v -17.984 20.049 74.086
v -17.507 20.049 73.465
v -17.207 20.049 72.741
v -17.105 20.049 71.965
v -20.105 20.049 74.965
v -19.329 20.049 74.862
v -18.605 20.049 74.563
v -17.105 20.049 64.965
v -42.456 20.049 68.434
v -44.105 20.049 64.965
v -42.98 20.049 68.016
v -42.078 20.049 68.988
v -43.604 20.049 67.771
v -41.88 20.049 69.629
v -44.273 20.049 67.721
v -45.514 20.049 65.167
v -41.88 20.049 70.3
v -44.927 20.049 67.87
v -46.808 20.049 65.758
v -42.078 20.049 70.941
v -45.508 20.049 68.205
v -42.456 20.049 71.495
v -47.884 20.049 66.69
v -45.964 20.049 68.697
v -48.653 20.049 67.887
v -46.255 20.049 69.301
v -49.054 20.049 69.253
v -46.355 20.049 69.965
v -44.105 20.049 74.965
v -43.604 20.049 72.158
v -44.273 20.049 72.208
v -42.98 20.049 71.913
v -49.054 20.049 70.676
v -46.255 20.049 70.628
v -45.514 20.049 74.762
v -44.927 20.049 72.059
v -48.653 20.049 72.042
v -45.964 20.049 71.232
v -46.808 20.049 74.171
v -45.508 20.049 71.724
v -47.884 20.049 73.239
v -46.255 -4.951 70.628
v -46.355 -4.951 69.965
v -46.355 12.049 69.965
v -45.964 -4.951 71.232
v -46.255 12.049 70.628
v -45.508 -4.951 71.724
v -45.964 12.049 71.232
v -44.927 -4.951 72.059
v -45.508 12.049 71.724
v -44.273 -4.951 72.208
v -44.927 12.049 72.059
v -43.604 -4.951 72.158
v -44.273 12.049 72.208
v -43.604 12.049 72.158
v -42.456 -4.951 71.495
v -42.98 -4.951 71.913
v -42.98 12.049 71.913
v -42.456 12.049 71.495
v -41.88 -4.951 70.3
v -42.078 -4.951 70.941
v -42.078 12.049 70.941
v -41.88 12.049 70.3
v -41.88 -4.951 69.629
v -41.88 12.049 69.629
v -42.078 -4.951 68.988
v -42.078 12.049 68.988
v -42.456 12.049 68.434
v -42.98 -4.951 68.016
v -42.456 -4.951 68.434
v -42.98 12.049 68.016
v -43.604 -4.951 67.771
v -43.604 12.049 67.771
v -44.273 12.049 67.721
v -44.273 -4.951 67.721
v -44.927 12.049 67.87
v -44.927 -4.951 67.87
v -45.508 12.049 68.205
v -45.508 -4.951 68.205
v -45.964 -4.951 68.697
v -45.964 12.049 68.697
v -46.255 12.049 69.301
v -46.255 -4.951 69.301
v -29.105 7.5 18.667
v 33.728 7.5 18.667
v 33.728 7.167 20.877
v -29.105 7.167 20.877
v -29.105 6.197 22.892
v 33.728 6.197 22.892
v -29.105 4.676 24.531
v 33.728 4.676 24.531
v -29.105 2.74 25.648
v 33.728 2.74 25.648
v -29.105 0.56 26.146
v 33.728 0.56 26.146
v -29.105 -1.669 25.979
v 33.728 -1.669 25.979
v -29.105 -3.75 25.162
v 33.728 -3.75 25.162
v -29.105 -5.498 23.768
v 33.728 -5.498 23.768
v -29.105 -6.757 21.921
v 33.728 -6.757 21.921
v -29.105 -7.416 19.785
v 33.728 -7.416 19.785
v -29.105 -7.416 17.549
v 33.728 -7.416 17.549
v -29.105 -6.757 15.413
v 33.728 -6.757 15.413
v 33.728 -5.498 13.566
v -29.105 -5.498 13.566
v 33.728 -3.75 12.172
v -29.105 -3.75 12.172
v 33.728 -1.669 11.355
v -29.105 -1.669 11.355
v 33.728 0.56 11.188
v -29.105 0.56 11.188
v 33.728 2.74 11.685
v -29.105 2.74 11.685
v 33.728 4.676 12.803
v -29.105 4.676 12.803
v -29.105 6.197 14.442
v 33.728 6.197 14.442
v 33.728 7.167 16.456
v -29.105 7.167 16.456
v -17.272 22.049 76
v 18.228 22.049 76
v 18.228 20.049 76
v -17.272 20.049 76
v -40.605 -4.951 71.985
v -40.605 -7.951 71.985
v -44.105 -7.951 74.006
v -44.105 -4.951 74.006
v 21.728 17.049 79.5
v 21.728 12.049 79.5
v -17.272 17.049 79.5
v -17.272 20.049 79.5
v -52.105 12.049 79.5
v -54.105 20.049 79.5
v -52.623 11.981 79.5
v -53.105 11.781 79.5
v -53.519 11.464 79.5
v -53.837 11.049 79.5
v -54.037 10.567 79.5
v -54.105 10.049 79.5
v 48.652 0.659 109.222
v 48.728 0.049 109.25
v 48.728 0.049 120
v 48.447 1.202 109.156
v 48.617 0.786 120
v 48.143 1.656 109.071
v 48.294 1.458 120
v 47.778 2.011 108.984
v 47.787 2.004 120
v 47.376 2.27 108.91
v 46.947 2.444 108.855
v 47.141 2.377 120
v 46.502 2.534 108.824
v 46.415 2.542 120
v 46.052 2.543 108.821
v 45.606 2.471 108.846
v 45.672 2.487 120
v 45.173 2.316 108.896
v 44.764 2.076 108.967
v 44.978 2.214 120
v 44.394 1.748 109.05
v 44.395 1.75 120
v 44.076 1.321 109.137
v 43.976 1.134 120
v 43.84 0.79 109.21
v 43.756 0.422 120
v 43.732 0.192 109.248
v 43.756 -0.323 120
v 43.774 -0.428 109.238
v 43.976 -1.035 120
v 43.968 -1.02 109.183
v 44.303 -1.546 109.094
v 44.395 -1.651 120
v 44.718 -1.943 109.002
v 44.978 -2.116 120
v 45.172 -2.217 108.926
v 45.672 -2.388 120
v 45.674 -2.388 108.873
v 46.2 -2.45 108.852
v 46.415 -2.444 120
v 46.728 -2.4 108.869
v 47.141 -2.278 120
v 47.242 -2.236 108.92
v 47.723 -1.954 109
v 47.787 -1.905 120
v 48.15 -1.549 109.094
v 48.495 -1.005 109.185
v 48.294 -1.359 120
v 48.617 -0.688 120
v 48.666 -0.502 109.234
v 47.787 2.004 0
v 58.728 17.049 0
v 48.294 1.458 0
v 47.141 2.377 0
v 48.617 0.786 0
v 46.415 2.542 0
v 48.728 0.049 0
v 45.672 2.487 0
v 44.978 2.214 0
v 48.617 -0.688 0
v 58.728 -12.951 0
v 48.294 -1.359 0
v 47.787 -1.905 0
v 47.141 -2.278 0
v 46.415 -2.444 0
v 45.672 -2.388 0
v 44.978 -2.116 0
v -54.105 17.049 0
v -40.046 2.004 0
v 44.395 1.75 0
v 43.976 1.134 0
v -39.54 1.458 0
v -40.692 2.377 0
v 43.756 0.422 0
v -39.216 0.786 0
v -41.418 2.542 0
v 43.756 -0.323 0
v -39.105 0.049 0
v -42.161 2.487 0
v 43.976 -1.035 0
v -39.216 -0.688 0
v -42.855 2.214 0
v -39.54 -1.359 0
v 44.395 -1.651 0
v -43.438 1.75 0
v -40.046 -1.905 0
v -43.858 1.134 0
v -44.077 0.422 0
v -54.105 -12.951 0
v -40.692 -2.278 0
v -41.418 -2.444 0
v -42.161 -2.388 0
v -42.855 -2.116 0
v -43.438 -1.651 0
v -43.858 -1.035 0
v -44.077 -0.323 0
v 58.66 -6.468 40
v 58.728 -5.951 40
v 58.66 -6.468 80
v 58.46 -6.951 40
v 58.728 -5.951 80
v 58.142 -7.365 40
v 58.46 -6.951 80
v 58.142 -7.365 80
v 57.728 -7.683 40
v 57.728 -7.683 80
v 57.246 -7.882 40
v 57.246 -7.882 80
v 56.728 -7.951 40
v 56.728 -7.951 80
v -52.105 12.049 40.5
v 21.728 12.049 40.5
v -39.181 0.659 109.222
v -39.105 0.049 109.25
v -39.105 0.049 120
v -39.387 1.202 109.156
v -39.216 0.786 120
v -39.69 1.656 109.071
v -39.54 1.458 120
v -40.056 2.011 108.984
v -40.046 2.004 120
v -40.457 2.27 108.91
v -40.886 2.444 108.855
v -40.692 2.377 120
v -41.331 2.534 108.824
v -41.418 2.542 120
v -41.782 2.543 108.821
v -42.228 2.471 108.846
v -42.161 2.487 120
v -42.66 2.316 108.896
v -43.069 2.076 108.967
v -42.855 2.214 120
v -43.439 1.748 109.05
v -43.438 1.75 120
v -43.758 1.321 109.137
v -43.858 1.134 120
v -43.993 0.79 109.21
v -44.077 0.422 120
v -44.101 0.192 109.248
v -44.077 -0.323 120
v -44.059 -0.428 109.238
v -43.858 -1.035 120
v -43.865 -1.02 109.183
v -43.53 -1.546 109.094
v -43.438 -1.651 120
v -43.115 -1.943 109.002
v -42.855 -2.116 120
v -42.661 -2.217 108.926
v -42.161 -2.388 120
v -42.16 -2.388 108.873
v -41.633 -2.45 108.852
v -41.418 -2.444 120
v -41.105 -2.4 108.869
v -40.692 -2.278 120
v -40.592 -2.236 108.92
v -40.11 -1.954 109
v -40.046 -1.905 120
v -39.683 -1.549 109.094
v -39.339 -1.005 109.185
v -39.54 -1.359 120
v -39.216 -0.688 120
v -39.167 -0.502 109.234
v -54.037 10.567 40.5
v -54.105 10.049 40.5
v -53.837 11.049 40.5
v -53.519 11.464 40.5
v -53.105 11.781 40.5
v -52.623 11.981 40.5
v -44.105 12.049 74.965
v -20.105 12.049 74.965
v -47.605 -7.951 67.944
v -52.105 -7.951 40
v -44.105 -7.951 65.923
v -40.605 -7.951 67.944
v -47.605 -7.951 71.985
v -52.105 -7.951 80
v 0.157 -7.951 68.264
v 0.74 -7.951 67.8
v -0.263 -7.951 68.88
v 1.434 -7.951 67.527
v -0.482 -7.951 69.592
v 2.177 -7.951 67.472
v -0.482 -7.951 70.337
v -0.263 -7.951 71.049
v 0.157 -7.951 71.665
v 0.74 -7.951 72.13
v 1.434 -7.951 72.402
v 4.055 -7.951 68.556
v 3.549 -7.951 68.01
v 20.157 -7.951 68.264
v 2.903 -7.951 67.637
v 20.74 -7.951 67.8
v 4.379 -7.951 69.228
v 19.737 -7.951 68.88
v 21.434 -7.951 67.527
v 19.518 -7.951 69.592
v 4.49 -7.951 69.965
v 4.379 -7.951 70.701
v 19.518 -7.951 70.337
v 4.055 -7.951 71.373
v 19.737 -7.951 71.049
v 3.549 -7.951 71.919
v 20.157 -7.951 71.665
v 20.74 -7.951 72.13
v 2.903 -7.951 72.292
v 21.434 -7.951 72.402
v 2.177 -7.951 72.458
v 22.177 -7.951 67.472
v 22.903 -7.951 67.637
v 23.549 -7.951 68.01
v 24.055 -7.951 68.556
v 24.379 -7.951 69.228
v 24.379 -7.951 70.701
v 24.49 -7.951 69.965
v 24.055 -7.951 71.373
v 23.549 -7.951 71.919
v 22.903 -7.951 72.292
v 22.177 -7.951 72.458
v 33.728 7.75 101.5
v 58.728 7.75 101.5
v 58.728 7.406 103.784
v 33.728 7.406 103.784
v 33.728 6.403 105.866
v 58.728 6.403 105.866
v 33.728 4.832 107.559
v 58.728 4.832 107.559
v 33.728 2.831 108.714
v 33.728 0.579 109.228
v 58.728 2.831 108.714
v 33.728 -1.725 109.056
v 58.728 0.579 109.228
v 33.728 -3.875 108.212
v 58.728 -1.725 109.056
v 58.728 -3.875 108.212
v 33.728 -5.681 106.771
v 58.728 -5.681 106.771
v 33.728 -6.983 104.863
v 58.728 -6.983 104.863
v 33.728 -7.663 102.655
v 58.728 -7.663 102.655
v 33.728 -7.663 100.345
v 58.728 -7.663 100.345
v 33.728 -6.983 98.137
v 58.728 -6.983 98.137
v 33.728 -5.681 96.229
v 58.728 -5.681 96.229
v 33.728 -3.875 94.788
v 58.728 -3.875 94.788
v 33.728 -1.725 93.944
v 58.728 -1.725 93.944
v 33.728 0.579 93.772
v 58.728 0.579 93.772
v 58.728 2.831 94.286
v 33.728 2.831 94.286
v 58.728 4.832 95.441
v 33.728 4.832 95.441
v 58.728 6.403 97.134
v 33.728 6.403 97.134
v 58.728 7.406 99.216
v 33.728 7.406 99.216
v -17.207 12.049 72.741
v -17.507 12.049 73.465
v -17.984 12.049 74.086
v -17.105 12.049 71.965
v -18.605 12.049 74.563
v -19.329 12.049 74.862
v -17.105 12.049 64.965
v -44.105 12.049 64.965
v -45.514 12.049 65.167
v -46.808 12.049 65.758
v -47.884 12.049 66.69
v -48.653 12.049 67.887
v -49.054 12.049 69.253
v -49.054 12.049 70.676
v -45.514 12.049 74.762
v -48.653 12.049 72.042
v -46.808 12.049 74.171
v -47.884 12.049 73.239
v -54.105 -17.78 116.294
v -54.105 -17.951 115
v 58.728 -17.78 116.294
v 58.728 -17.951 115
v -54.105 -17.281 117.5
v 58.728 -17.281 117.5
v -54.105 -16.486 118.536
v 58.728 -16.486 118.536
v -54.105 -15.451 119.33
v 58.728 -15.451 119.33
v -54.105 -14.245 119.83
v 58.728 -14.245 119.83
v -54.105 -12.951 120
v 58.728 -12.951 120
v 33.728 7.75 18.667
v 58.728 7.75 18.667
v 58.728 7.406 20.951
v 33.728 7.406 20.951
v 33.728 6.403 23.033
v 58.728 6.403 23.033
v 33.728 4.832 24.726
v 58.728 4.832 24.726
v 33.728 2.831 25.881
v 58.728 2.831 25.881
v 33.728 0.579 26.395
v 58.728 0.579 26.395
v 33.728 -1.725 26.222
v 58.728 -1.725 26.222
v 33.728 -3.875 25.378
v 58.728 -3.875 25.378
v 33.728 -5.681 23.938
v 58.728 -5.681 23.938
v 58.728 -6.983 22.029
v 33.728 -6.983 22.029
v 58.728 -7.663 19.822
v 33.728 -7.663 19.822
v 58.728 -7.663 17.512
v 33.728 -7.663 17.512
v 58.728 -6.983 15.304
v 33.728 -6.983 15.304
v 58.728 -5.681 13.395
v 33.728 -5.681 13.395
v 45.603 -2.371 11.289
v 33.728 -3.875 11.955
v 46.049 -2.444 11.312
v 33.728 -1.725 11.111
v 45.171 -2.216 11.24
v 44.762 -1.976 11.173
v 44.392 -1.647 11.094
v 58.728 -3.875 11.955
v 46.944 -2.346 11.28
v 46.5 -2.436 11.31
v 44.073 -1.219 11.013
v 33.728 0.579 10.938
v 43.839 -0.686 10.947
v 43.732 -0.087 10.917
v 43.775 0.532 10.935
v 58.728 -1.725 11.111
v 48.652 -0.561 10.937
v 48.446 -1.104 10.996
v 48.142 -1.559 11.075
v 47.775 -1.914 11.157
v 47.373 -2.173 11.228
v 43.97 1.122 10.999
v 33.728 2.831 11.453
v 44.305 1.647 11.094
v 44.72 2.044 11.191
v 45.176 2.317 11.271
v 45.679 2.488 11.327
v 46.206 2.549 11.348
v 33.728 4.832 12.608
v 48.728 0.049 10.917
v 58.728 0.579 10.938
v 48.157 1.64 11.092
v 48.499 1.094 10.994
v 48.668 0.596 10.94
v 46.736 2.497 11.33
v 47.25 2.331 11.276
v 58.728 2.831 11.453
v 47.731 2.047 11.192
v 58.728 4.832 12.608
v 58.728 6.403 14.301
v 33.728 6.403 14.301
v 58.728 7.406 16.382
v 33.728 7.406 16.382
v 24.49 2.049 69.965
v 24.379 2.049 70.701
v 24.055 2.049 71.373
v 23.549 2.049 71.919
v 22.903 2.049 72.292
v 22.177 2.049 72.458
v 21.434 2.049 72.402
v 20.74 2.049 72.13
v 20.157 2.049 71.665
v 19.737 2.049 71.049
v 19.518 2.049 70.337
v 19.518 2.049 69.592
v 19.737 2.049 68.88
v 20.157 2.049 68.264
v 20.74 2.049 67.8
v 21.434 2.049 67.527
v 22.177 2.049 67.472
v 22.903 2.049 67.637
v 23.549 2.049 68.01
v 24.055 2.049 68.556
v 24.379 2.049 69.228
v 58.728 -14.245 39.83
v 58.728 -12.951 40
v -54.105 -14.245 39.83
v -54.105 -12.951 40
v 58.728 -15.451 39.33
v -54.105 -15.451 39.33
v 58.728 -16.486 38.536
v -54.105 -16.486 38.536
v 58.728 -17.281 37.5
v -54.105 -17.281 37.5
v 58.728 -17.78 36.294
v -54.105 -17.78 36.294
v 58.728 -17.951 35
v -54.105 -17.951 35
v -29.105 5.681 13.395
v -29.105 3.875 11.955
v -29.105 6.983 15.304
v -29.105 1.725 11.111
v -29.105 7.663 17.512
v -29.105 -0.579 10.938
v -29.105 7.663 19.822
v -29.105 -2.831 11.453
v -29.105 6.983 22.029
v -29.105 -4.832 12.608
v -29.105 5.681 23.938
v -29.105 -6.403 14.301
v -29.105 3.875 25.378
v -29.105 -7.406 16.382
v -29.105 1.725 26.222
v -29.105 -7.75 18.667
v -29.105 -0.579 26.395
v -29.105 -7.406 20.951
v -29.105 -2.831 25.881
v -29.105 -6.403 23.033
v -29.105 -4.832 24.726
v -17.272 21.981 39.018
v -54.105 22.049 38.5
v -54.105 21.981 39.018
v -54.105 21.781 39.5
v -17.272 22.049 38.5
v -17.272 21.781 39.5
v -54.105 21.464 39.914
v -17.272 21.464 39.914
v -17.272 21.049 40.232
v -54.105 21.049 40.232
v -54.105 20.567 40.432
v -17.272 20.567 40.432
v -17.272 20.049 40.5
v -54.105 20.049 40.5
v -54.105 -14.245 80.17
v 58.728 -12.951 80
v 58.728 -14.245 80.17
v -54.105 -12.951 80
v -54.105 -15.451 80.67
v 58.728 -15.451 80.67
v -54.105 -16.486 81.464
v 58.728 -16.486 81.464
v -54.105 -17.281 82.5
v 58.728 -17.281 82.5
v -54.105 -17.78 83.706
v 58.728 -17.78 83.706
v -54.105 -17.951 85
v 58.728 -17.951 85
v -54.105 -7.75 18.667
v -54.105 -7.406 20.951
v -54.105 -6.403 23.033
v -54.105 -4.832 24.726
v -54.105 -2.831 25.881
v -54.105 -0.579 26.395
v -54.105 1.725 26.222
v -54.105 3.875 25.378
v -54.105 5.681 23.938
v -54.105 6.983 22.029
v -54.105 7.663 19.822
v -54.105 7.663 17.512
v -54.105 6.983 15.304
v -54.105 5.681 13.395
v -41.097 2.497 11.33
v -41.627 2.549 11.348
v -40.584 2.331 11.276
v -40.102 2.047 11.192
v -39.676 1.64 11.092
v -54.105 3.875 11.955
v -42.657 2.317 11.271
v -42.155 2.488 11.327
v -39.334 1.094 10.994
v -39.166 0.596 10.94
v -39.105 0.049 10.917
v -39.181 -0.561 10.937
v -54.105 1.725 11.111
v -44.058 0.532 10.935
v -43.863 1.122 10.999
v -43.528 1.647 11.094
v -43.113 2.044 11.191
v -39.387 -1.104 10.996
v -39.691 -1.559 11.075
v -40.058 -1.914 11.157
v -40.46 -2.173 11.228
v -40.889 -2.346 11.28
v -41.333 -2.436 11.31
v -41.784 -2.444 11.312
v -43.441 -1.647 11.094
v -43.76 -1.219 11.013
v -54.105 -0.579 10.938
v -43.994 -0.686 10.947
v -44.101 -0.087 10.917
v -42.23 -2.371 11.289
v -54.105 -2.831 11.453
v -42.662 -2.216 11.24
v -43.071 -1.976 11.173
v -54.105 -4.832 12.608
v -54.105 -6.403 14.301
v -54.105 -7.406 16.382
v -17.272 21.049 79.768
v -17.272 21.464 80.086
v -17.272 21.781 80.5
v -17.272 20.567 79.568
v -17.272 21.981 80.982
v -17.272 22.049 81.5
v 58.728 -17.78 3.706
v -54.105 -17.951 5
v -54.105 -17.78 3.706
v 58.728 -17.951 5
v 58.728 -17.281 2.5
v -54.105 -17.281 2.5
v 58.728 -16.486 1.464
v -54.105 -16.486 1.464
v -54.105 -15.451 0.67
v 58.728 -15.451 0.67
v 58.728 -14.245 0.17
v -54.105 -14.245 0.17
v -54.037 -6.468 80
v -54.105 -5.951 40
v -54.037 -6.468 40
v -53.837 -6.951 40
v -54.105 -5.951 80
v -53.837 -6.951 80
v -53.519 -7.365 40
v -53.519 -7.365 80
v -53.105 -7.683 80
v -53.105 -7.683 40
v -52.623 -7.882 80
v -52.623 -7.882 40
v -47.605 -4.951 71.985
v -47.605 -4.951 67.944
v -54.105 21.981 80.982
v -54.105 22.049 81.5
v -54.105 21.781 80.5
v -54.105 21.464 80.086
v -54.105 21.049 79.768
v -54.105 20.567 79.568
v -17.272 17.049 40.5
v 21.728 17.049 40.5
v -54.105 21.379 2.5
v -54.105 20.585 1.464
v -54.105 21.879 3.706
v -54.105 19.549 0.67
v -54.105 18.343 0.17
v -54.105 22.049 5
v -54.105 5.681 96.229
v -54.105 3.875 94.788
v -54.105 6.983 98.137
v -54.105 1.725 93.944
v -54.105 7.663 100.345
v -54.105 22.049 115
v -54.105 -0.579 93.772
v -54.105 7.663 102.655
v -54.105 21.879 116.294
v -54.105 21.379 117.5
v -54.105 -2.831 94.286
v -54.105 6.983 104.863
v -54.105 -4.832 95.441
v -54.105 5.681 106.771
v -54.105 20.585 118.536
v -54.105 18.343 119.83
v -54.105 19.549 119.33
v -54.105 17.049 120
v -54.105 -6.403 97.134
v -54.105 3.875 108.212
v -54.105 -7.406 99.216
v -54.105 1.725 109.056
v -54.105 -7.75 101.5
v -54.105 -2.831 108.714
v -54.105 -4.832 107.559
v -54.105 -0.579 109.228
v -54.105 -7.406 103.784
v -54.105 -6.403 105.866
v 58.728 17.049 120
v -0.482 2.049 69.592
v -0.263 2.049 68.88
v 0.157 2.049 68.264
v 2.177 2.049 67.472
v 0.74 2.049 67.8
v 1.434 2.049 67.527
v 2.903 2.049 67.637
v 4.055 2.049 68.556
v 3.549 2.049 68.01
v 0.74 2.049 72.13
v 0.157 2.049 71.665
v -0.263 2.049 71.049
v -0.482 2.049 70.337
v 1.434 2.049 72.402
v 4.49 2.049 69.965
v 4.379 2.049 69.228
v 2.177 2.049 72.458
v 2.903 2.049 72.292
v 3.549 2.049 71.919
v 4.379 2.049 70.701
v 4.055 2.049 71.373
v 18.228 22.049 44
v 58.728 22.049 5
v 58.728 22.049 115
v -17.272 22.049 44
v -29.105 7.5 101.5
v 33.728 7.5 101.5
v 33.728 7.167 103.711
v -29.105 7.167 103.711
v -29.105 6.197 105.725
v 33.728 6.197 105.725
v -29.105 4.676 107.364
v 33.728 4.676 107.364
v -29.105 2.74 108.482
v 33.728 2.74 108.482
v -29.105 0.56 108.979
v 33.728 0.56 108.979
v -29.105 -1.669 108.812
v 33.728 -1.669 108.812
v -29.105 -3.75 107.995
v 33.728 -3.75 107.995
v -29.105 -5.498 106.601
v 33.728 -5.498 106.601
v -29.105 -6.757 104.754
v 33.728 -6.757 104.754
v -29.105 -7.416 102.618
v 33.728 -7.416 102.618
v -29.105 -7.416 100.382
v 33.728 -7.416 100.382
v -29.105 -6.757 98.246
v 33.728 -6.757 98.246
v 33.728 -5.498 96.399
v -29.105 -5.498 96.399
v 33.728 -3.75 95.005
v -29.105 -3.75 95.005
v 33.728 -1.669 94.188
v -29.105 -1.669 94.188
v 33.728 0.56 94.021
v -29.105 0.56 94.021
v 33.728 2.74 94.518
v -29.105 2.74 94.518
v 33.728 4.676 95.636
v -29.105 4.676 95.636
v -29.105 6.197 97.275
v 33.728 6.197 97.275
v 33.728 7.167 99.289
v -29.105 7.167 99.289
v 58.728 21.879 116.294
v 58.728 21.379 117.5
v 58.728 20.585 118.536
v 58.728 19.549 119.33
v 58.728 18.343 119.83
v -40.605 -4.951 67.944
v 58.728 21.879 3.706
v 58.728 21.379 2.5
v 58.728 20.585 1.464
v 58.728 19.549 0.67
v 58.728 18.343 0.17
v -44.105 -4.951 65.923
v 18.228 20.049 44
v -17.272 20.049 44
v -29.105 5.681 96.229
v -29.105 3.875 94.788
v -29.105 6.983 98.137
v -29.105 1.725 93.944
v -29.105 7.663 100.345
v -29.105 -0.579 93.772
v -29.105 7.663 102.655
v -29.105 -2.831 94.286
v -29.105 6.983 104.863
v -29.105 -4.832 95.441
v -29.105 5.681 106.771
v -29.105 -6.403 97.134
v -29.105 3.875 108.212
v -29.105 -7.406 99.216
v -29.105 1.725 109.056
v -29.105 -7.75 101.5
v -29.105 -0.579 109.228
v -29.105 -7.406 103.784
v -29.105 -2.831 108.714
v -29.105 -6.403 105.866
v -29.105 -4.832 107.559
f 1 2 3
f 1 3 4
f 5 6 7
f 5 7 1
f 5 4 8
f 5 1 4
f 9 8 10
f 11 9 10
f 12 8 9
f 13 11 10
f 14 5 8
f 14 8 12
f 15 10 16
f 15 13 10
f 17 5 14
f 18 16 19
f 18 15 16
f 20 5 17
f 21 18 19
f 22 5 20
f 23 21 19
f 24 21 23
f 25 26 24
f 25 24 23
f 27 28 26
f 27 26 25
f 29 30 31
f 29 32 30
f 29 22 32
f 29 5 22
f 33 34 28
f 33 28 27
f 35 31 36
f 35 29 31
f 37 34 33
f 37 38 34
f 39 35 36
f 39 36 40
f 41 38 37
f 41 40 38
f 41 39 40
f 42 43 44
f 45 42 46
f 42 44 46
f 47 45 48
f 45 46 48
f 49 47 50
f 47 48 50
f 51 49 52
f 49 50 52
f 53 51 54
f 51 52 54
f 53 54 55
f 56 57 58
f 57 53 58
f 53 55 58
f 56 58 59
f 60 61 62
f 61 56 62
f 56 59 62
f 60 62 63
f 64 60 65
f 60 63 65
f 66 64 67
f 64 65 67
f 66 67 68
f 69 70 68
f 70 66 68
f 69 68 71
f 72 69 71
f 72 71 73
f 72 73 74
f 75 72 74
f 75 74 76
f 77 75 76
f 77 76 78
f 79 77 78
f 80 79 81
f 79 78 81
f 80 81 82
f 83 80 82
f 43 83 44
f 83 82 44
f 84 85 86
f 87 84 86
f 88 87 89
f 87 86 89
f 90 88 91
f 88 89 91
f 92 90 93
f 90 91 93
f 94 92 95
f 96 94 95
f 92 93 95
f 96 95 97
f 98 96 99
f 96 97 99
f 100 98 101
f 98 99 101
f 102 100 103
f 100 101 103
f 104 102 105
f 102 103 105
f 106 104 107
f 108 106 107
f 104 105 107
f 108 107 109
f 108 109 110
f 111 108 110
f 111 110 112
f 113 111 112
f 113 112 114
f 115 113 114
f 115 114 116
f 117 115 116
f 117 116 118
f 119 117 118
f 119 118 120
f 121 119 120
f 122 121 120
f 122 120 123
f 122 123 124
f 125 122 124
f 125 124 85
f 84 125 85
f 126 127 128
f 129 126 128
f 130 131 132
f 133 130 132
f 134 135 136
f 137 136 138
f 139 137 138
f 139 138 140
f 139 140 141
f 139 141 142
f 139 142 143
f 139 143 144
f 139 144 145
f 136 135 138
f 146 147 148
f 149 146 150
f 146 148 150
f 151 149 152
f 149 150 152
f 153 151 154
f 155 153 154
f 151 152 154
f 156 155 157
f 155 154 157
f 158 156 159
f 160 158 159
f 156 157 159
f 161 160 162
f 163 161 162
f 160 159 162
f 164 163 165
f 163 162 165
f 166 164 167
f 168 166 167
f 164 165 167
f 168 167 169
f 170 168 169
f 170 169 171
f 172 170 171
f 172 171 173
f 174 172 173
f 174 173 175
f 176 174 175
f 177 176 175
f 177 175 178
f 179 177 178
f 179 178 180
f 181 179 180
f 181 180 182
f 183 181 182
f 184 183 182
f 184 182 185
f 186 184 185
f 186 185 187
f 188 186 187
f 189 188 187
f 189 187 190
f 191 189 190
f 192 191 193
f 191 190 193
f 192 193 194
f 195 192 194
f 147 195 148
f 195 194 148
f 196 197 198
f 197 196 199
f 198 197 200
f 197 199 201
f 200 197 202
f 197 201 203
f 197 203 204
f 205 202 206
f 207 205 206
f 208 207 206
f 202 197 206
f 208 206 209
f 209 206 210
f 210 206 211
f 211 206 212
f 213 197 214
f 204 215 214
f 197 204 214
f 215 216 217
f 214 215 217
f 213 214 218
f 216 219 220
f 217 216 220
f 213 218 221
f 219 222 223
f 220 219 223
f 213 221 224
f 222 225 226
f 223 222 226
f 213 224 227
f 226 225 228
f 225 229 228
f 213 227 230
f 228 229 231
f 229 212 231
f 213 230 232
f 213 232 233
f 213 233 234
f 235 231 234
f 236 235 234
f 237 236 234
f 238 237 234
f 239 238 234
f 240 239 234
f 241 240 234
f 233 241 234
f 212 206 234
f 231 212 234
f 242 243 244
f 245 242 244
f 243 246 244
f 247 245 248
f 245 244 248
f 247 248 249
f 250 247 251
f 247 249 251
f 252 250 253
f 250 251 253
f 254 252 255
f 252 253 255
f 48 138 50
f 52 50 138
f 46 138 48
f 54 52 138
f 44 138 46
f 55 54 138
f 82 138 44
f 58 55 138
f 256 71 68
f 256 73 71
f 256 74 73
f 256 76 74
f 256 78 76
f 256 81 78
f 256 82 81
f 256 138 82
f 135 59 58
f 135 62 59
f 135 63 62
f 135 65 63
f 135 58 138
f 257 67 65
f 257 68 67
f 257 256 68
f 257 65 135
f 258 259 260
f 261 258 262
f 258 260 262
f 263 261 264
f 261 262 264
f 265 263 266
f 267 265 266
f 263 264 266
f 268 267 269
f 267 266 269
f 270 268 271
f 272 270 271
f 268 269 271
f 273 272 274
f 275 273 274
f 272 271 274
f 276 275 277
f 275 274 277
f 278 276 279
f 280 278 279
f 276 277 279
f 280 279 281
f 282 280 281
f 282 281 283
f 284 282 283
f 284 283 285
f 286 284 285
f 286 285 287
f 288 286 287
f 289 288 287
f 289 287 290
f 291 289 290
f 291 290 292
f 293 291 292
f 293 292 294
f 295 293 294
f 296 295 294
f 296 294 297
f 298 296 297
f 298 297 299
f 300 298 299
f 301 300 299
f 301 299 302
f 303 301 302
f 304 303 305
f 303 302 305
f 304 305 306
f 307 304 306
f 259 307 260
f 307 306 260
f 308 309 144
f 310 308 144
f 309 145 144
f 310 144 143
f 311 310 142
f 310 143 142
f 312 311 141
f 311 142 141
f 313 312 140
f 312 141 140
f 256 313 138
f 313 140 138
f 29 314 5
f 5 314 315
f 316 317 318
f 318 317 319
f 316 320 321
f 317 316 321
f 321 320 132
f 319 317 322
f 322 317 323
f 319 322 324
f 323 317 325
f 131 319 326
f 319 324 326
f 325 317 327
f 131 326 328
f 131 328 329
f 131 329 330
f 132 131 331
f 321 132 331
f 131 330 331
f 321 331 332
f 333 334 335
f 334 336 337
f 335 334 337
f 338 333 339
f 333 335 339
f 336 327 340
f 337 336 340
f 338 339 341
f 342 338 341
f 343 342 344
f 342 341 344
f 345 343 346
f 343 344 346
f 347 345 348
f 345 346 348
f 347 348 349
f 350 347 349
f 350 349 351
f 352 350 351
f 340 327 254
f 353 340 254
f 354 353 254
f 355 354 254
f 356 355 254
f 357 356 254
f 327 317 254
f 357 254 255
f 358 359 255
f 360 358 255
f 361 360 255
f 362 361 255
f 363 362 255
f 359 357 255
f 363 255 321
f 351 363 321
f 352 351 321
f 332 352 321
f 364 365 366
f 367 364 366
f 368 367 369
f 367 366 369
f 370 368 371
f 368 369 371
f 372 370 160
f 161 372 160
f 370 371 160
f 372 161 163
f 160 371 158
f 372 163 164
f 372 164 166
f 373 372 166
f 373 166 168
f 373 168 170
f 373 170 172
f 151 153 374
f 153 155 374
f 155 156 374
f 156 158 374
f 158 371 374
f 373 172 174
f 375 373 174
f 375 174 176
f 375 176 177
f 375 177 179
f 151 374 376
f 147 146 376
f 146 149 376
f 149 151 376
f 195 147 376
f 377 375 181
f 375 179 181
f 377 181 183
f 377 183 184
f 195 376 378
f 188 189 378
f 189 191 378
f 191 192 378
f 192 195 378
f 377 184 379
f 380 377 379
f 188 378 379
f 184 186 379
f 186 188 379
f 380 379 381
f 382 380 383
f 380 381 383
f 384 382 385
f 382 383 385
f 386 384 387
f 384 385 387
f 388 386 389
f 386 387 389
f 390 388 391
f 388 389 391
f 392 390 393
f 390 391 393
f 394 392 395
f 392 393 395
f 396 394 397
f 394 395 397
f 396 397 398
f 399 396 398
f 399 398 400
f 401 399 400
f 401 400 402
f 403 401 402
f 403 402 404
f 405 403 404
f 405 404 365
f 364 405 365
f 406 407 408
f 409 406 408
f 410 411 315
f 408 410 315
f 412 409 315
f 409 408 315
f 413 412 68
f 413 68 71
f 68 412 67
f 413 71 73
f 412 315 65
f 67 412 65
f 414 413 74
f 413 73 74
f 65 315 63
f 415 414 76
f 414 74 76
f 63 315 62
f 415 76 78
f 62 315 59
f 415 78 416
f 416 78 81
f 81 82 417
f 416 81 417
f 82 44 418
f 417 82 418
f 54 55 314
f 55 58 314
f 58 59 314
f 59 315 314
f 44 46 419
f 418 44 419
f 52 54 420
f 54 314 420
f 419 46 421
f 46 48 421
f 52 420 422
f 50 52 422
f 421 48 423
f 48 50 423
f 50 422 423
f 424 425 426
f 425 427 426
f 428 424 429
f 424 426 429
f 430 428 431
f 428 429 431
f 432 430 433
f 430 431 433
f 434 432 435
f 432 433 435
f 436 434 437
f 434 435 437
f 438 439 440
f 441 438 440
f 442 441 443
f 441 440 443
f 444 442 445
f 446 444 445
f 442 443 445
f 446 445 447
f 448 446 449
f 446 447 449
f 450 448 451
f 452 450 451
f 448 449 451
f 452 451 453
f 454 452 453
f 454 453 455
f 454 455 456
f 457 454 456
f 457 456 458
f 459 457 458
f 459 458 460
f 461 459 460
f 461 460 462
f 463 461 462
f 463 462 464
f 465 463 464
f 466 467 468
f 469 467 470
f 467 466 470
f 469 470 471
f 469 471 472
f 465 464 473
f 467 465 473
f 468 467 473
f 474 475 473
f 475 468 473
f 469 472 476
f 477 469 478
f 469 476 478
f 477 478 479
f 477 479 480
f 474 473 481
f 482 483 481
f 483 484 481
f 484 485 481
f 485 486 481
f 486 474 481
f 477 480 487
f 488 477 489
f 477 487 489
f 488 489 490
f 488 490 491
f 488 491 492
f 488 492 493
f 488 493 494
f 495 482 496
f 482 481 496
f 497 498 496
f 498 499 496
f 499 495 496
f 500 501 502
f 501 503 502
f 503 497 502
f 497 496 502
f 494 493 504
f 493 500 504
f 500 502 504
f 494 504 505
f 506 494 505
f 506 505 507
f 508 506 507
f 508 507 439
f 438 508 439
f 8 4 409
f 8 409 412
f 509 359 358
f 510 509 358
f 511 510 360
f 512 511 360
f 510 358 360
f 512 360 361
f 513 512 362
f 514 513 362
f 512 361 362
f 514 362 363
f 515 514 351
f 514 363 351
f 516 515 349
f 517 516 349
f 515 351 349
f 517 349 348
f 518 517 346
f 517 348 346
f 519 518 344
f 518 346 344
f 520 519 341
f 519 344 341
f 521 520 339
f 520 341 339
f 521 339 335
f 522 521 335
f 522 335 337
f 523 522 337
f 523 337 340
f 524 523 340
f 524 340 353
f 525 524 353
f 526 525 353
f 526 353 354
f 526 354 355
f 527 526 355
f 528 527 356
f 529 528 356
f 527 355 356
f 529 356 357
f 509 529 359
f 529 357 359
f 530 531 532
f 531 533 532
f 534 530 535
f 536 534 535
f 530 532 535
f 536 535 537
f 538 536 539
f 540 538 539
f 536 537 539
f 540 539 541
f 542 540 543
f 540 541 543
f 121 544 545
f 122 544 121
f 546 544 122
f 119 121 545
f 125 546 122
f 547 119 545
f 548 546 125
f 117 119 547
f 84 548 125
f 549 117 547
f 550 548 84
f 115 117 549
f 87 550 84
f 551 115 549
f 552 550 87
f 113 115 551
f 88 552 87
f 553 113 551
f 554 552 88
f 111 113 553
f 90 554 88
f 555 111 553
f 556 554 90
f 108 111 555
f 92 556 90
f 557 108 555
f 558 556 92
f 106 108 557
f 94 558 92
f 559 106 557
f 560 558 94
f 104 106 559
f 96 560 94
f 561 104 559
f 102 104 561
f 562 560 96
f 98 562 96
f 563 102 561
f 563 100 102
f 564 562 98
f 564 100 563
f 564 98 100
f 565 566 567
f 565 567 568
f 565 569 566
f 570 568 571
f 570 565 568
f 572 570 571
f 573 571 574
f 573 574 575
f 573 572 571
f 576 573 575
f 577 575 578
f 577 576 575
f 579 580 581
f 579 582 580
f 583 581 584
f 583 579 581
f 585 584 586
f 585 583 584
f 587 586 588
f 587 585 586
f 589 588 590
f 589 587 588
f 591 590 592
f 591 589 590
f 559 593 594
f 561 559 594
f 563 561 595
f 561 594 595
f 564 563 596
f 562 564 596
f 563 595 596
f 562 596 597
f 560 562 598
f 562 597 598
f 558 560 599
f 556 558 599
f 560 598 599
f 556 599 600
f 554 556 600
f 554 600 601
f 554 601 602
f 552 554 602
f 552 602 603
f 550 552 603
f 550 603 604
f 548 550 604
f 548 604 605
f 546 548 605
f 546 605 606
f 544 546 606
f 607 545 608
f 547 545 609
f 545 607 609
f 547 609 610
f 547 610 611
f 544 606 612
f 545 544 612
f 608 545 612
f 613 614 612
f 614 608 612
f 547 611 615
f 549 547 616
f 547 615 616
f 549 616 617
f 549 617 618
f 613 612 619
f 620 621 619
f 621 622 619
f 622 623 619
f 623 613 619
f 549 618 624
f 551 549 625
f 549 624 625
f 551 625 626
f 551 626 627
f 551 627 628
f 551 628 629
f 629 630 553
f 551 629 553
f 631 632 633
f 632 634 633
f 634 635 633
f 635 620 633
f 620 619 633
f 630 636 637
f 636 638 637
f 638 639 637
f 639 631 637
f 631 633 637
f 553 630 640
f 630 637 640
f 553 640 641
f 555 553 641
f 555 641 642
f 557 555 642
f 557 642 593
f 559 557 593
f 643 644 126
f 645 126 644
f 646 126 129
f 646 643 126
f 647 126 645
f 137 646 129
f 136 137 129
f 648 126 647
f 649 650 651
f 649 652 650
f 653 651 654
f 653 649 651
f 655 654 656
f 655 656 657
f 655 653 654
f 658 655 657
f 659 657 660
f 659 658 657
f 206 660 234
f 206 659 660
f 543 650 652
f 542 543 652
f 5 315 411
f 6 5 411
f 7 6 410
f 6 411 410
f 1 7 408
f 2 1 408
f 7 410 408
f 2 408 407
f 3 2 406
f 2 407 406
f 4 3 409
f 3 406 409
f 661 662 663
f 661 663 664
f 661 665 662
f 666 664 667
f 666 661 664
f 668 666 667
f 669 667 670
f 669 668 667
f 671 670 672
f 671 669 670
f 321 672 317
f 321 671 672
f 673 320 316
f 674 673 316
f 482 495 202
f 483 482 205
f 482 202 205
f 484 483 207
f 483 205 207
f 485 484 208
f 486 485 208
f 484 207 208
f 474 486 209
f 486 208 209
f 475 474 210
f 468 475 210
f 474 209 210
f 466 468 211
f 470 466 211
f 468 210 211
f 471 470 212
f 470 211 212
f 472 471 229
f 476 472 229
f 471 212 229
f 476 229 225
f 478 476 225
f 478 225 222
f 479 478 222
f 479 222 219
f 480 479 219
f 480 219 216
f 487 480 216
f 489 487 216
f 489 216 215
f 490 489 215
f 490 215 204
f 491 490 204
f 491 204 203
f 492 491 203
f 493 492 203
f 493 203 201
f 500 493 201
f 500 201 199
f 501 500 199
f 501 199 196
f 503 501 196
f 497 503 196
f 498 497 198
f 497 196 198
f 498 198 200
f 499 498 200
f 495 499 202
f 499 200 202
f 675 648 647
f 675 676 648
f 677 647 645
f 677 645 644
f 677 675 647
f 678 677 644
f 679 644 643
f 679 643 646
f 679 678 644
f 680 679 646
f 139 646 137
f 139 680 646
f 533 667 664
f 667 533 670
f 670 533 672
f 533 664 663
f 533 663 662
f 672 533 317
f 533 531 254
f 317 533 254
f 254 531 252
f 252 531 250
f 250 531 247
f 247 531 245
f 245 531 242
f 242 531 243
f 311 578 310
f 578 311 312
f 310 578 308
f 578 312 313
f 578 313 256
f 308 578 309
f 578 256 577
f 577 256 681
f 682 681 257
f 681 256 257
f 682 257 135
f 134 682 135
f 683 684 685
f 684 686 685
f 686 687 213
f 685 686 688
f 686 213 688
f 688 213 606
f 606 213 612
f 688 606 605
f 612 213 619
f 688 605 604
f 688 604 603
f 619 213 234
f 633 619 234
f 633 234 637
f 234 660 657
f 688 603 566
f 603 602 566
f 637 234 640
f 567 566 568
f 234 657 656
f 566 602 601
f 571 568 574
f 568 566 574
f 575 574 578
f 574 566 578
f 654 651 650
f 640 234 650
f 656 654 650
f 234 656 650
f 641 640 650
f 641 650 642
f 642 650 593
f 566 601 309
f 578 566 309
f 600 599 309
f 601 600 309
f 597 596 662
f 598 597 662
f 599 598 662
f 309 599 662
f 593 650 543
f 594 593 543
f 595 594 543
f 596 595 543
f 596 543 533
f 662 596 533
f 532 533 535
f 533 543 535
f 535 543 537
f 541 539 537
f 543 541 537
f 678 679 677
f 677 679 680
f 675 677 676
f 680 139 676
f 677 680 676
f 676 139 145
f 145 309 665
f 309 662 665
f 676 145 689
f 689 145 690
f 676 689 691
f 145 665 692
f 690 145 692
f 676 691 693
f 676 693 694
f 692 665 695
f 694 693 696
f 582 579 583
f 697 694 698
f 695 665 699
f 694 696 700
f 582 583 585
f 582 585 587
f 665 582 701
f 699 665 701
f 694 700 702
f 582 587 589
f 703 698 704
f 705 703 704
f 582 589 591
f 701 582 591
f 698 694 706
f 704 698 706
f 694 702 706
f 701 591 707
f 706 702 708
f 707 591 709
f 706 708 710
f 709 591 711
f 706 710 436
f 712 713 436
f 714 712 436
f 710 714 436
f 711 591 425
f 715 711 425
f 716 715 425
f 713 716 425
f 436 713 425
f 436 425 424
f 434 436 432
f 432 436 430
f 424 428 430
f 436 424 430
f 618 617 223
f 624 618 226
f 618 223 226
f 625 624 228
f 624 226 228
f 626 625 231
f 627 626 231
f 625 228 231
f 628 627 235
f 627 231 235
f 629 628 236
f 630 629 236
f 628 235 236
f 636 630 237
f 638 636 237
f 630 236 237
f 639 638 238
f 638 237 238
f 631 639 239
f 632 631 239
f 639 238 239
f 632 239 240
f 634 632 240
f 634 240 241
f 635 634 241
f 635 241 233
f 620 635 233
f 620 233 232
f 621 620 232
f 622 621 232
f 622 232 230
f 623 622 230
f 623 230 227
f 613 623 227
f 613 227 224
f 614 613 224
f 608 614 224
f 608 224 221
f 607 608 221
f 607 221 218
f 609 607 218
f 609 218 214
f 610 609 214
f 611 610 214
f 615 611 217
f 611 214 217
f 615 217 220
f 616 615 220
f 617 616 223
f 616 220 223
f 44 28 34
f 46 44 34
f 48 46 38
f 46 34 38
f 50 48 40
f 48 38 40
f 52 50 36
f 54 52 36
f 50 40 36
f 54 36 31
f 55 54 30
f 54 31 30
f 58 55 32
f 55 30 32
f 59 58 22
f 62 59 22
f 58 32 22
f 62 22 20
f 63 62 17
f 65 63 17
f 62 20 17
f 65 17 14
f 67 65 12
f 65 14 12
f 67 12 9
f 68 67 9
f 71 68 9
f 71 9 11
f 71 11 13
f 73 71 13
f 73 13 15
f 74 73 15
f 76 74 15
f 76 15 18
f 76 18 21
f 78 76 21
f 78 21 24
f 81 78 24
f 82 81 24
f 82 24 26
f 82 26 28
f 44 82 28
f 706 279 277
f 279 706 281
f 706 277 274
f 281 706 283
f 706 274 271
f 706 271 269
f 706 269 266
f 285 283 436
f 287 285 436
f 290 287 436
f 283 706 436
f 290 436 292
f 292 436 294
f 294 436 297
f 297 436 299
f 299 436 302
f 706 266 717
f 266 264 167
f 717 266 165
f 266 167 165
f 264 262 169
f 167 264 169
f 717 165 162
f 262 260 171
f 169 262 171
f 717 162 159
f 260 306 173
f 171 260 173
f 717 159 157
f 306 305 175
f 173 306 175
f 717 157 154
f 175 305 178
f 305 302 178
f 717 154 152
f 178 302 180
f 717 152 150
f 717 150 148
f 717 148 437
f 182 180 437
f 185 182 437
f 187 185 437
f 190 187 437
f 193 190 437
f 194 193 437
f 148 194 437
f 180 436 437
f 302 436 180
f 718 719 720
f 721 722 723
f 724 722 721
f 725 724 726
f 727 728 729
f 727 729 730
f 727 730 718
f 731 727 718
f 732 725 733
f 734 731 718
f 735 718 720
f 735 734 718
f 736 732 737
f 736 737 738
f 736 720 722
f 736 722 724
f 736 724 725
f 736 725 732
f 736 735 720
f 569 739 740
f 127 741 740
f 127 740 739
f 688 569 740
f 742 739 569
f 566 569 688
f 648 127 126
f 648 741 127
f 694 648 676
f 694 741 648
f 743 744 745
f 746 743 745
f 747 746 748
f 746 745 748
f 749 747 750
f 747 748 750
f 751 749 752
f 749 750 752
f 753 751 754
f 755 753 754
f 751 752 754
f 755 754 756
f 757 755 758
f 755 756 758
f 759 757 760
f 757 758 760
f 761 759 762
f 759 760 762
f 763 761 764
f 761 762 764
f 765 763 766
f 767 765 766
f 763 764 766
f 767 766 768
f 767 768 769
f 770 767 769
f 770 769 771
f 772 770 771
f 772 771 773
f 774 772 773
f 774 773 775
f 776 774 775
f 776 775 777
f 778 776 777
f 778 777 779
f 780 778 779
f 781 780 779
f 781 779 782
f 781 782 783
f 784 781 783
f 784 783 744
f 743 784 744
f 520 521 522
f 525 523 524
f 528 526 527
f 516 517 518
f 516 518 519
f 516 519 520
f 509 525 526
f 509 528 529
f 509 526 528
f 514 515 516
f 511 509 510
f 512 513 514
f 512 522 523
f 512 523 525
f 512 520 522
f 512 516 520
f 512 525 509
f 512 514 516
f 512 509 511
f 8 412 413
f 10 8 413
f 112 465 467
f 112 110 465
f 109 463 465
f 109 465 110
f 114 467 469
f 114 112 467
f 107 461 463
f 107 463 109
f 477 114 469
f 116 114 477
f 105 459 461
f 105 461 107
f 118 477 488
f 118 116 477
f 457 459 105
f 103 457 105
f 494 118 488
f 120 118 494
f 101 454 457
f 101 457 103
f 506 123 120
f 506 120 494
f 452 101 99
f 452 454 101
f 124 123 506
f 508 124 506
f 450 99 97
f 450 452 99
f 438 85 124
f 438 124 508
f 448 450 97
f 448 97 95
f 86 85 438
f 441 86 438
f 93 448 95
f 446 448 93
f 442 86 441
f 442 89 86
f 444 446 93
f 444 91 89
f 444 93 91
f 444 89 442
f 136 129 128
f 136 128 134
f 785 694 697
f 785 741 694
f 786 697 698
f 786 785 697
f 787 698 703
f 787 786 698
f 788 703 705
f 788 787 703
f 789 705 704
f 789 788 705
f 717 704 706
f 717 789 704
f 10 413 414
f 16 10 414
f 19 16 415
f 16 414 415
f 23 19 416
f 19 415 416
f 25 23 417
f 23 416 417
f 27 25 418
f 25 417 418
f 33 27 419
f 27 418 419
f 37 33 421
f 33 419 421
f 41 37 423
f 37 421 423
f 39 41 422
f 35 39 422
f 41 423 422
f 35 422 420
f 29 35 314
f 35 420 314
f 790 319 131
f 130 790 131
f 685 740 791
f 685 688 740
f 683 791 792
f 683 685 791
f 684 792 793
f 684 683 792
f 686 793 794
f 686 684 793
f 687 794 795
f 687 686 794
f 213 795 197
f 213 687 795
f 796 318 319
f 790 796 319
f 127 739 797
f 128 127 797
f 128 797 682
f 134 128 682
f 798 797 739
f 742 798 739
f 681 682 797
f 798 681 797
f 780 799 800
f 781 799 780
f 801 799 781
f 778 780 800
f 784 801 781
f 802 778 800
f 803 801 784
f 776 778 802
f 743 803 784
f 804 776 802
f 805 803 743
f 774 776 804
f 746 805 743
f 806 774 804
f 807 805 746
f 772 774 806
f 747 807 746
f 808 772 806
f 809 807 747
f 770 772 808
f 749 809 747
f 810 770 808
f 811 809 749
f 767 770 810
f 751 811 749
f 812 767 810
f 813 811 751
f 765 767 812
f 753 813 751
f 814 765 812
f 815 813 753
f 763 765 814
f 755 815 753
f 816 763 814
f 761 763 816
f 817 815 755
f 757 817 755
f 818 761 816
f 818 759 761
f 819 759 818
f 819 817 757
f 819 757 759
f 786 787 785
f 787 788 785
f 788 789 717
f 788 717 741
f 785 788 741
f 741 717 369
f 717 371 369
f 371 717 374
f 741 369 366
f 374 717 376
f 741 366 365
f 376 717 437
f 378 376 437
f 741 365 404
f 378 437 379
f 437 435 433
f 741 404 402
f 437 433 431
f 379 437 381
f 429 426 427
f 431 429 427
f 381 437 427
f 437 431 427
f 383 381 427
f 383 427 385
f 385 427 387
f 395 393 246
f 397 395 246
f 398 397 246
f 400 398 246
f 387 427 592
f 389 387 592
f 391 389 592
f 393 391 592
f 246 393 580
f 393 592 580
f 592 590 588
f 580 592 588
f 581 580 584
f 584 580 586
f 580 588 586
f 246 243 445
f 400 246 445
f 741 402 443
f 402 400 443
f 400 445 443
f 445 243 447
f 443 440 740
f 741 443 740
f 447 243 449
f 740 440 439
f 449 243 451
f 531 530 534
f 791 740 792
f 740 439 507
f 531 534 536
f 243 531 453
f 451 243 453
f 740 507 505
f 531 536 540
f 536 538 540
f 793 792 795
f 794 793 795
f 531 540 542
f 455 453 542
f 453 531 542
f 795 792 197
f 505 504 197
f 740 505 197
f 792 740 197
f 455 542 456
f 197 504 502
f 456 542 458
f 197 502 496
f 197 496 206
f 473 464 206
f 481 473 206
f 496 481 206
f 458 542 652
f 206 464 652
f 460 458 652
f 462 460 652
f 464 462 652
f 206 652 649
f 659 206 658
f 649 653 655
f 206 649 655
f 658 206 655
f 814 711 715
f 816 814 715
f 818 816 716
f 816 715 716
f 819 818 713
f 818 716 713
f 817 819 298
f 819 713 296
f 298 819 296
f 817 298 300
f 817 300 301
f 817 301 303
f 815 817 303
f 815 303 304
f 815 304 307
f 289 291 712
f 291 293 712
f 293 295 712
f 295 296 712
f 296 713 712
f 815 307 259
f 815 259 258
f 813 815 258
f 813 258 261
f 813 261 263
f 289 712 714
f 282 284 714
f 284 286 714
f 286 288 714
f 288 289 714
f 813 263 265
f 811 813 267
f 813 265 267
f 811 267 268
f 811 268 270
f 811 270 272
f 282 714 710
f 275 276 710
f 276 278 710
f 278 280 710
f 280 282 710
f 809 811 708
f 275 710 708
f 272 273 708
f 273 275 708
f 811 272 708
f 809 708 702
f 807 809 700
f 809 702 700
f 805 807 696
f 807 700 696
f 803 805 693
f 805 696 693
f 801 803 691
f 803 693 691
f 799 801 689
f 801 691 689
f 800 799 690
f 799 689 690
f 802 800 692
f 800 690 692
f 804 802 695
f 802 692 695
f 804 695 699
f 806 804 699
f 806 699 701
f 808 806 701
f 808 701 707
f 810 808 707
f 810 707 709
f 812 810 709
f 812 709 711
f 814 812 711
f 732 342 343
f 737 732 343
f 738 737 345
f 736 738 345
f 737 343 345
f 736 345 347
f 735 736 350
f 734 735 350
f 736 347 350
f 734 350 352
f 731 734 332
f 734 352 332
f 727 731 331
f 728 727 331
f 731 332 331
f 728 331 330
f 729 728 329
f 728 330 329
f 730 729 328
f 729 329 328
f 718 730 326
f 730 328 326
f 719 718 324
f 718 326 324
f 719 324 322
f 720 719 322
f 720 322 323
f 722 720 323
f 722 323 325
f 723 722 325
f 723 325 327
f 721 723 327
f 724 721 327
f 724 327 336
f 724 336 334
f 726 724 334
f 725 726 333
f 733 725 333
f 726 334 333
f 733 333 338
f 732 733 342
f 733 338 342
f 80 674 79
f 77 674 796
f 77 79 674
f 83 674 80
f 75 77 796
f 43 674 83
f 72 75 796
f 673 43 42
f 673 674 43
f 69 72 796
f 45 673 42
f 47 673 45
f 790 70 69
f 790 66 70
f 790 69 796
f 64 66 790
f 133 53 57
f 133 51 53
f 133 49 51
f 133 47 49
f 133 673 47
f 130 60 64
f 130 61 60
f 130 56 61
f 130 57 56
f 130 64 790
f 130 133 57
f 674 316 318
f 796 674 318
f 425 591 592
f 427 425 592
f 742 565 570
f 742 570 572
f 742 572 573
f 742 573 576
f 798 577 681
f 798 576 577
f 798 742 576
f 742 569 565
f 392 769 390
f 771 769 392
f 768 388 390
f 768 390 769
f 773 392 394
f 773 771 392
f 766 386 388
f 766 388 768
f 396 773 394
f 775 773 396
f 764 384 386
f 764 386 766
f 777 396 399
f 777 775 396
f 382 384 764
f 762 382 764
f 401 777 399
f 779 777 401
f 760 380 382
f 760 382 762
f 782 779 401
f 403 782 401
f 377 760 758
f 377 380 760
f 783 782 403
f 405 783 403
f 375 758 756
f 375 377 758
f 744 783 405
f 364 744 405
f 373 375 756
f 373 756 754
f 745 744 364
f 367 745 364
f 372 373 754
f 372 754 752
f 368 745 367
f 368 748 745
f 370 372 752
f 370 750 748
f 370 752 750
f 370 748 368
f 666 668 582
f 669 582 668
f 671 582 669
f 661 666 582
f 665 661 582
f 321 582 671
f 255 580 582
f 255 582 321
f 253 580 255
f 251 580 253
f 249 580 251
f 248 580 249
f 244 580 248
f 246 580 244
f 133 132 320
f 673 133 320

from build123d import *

# Parameters (mm, degrees)
F0_W      = 112.8332
F0_H      = 30
F1_DEPTH  = 120
F3_DEPTH  = 10
F6_DEPTH  = 39
F7_DEPTH  = 39
F8_R      = 7.5
F8_W      = 10
F8_H      = 40
F9_DEPTH  = 120
F11_DEPTH = 8
F12_R     = 2.25
F13_DEPTH = 50
F14_R     = 2.25
F15_DEPTH = 3
F16_R     = 5
F17_R     = 2
F14_R_2   = 2.5
F18_DEPTH = 10
F19_R     = 7.75
F19_R_2   = 7.5
F20_DEPTH = 25
F21_R     = 7.75
F21_R_2   = 7.5
F22_DEPTH = 25
F24_R     = 2.5
F23_R     = 2.5
F25_DEPTH = 13.1
F26_DEPTH = 25


with BuildPart() as f1:
    # F0 (on Top) → F1 (new body)
    with BuildSketch(Plane.XY):
        with Locations((2.3114552433, -2.9506393059)):
            Rectangle(F0_W, F0_H)
    extrude(amount=F1_DEPTH)

    # F2 (on face) → F3 (join)
    with BuildSketch(Plane(origin=(0, 12.0493606941, 0), x_dir=(-1, 0, 0), z_dir=(0, 1, 0))):
        Polygon((17.2719447567, 40.5), (-21.7280552433, 40.5), (-21.7280552433, 79.5), (17.2719447567, 79.5), (54.1051447567, 79.5), (54.1051447567, 120), (-58.7280552433, 120), (-58.7280552433, 0), (54.1051447567, 0), (54.1051447567, 40.5), align=None)
    extrude(amount=F3_DEPTH)

    # F5 (on face) → F6 (join)
    with BuildSketch(Plane(origin=(21.7280552433, 0, 0), x_dir=(0, -1, 0), z_dir=(-1, 0, 0))):
        Polygon((-22.0493606941, 40.5), (-17.0493606941, 40.5), (-20.0493606941, 44), (-22.0493606941, 44), align=None)
        Polygon((-22.0493606941, 79.5), (-22.0493606941, 76), (-20.0493606941, 76), (-17.0493606941, 79.5), align=None)
    extrude(amount=F6_DEPTH)

    # F4 (on face) → F7 (join)
    with BuildSketch(Plane.XY.offset(40.5)):
        Polygon((21.7280552433, 22.0493606941), (18.2280552433, 22.0493606941), (18.2280552433, 20.0493606941), (21.7280552433, 17.0493606941), align=None)
    extrude(amount=F7_DEPTH)

    # F8 (on face) → F9 (cut)
    with BuildSketch(Plane.YZ.offset(58.7280552433)):
        with Locations((0, 101.5)):
            Circle(F8_R)
        with Locations((0, 18.6668)):
            Circle(F8_R)
        with Locations((-12.9506393059, 60)):
            Rectangle(F8_W, F8_H)
    extrude(amount=-F9_DEPTH, mode=Mode.SUBTRACT)


with BuildPart() as f11:
    # F10 (on face) → F11 (new body)
    with BuildSketch(Plane(origin=(0, 12.0493606941, 0), x_dir=(-1, 0, 0), z_dir=(0, 1, 0))):
        with BuildLine():
            Line((17.1051447567, 64.9645727873), (44.1051447567, 64.9645727873))
            ThreePointArc((44.1051447567, 64.9645727873), (49.1051447567, 69.9645727873), (44.1051447567, 74.9645727873))
            Line((44.1051447567, 74.9645727873), (20.1051447567, 74.9645727873))
            ThreePointArc((20.1051447567, 74.9645727873), (17.9838244131, 74.0858931308), (17.1051447567, 71.9645727873))
            Line((17.1051447567, 71.9645727873), (17.1051447567, 64.9645727873))
        make_face()
    extrude(amount=F11_DEPTH)


with BuildPart() as f13_tool:
    # F12 (on face) → F13 (new body)
    with BuildSketch(Plane(origin=(0, 20.0493606941, 0), x_dir=(-1, 0, 0), z_dir=(0, 1, 0))):
        with Locations((44.1051447567, 69.9645727873)):
            Circle(F12_R)
    extrude(amount=-F13_DEPTH)


with BuildPart() as f1_1:
    add(f1.part)

    # F13: cut by f13_tool
    add(f13_tool.part, mode=Mode.SUBTRACT)

    # F14 (on face) → F15 (cut)
    with BuildSketch(Plane.XZ.offset(7.9506393059)):
        Polygon((-40.6051447567, 67.9438468451), (-40.6051447567, 71.9852987294), (-44.1051447567, 74.0060246716), (-47.6051447567, 71.9852987294), (-47.6051447567, 67.9438468451), (-44.1051447567, 65.923120903), align=None)
        with Locations((-44.1051447567, 69.9645727873)):
            Circle(F14_R, mode=Mode.SUBTRACT)
    extrude(amount=-F15_DEPTH, mode=Mode.SUBTRACT)

    # F16
    f16_edges = [f1_1.edges().sort_by_distance(p)[0] for p in [
        (2.311455, -17.950639, 40),
        (2.311455, -17.950639, 80),
        (2.311455, -17.950639, 120),
        (2.311455, 22.049361, 120),
        (2.311455, -17.950639, 0),
        (2.311455, 22.049361, 0),
    ]]
    fillet(f16_edges, radius=F16_R)

    # F17
    f17_edges = [f1_1.edges().sort_by_distance(p)[0] for p in [
        (-35.688545, 22.049361, 79.5),
        (-35.688545, 22.049361, 40.5),
        (-54.105145, 12.049361, 60),
        (-54.105145, -7.950639, 60),
        (58.728055, -7.950639, 60),
    ]]
    fillet(f17_edges, radius=F17_R)

    # F14 (on face) → F18 (cut)
    with BuildSketch(Plane.XZ.offset(7.9506393059)):
        with Locations((1.9898544997, 69.9645727873)):
            Circle(F14_R_2)
        with Locations((21.9898544997, 69.9645727873)):
            Circle(F14_R_2)
    extrude(amount=-F18_DEPTH, mode=Mode.SUBTRACT)

    # F19 (on face) → F20 (cut)
    with BuildSketch(Plane.YZ.offset(58.7280552433)):
        with Locations((0, 101.5)):
            Circle(F19_R)
        with Locations((0, 101.5)):
            Circle(F19_R_2, mode=Mode.SUBTRACT)
        with Locations((0, 18.6668)):
            Circle(F19_R)
        with Locations((0, 18.6668)):
            Circle(F19_R_2, mode=Mode.SUBTRACT)
    extrude(amount=-F20_DEPTH, mode=Mode.SUBTRACT)

    # F21 (on face) → F22 (cut)
    with BuildSketch(Plane(origin=(-54.1051447567, 0, 0), x_dir=(0, -1, 0), z_dir=(-1, 0, 0))):
        with Locations((0, 101.5)):
            Circle(F21_R)
        with Locations((0, 101.5)):
            Circle(F21_R_2, mode=Mode.SUBTRACT)
        with Locations((0, 18.6668)):
            Circle(F21_R)
        with Locations((0, 18.6668)):
            Circle(F21_R_2, mode=Mode.SUBTRACT)
    extrude(amount=-F22_DEPTH, mode=Mode.SUBTRACT)

    # F24 (on face) + F23 (on face) → F25 (cut)
    with BuildSketch(Plane.XY.offset(120)):
        with Locations((-41.6051447567, 0.0493606941)):
            Circle(F24_R)
        with Locations((46.2280552433, 0.0493606941)):
            Circle(F24_R)
    with BuildSketch(Plane(origin=(0, 0, 0), x_dir=(1, 0, 0), z_dir=(0, 0, -1))):
        with Locations((-41.6051447567, -0.0493606941)):
            Circle(F23_R)
        with Locations((46.2280552433, -0.0493606941)):
            Circle(F23_R)
    extrude(amount=-F25_DEPTH, dir=(0, 0, 1), mode=Mode.SUBTRACT)

    # F23 (on face) → F26 (cut)
    with BuildSketch(Plane(origin=(0, 0, 0), x_dir=(1, 0, 0), z_dir=(0, 0, -1))):
        with Locations((-41.6051447567, -0.0493606941)):
            Circle(F23_R)
        with Locations((46.2280552433, -0.0493606941)):
            Circle(F23_R)
    extrude(amount=-F26_DEPTH, mode=Mode.SUBTRACT)


with BuildPart() as f11_1:
    add(f11.part)

    # F13: cut by f13_tool
    add(f13_tool.part, mode=Mode.SUBTRACT)


solid = Compound([f1_1.part, f11_1.part])
